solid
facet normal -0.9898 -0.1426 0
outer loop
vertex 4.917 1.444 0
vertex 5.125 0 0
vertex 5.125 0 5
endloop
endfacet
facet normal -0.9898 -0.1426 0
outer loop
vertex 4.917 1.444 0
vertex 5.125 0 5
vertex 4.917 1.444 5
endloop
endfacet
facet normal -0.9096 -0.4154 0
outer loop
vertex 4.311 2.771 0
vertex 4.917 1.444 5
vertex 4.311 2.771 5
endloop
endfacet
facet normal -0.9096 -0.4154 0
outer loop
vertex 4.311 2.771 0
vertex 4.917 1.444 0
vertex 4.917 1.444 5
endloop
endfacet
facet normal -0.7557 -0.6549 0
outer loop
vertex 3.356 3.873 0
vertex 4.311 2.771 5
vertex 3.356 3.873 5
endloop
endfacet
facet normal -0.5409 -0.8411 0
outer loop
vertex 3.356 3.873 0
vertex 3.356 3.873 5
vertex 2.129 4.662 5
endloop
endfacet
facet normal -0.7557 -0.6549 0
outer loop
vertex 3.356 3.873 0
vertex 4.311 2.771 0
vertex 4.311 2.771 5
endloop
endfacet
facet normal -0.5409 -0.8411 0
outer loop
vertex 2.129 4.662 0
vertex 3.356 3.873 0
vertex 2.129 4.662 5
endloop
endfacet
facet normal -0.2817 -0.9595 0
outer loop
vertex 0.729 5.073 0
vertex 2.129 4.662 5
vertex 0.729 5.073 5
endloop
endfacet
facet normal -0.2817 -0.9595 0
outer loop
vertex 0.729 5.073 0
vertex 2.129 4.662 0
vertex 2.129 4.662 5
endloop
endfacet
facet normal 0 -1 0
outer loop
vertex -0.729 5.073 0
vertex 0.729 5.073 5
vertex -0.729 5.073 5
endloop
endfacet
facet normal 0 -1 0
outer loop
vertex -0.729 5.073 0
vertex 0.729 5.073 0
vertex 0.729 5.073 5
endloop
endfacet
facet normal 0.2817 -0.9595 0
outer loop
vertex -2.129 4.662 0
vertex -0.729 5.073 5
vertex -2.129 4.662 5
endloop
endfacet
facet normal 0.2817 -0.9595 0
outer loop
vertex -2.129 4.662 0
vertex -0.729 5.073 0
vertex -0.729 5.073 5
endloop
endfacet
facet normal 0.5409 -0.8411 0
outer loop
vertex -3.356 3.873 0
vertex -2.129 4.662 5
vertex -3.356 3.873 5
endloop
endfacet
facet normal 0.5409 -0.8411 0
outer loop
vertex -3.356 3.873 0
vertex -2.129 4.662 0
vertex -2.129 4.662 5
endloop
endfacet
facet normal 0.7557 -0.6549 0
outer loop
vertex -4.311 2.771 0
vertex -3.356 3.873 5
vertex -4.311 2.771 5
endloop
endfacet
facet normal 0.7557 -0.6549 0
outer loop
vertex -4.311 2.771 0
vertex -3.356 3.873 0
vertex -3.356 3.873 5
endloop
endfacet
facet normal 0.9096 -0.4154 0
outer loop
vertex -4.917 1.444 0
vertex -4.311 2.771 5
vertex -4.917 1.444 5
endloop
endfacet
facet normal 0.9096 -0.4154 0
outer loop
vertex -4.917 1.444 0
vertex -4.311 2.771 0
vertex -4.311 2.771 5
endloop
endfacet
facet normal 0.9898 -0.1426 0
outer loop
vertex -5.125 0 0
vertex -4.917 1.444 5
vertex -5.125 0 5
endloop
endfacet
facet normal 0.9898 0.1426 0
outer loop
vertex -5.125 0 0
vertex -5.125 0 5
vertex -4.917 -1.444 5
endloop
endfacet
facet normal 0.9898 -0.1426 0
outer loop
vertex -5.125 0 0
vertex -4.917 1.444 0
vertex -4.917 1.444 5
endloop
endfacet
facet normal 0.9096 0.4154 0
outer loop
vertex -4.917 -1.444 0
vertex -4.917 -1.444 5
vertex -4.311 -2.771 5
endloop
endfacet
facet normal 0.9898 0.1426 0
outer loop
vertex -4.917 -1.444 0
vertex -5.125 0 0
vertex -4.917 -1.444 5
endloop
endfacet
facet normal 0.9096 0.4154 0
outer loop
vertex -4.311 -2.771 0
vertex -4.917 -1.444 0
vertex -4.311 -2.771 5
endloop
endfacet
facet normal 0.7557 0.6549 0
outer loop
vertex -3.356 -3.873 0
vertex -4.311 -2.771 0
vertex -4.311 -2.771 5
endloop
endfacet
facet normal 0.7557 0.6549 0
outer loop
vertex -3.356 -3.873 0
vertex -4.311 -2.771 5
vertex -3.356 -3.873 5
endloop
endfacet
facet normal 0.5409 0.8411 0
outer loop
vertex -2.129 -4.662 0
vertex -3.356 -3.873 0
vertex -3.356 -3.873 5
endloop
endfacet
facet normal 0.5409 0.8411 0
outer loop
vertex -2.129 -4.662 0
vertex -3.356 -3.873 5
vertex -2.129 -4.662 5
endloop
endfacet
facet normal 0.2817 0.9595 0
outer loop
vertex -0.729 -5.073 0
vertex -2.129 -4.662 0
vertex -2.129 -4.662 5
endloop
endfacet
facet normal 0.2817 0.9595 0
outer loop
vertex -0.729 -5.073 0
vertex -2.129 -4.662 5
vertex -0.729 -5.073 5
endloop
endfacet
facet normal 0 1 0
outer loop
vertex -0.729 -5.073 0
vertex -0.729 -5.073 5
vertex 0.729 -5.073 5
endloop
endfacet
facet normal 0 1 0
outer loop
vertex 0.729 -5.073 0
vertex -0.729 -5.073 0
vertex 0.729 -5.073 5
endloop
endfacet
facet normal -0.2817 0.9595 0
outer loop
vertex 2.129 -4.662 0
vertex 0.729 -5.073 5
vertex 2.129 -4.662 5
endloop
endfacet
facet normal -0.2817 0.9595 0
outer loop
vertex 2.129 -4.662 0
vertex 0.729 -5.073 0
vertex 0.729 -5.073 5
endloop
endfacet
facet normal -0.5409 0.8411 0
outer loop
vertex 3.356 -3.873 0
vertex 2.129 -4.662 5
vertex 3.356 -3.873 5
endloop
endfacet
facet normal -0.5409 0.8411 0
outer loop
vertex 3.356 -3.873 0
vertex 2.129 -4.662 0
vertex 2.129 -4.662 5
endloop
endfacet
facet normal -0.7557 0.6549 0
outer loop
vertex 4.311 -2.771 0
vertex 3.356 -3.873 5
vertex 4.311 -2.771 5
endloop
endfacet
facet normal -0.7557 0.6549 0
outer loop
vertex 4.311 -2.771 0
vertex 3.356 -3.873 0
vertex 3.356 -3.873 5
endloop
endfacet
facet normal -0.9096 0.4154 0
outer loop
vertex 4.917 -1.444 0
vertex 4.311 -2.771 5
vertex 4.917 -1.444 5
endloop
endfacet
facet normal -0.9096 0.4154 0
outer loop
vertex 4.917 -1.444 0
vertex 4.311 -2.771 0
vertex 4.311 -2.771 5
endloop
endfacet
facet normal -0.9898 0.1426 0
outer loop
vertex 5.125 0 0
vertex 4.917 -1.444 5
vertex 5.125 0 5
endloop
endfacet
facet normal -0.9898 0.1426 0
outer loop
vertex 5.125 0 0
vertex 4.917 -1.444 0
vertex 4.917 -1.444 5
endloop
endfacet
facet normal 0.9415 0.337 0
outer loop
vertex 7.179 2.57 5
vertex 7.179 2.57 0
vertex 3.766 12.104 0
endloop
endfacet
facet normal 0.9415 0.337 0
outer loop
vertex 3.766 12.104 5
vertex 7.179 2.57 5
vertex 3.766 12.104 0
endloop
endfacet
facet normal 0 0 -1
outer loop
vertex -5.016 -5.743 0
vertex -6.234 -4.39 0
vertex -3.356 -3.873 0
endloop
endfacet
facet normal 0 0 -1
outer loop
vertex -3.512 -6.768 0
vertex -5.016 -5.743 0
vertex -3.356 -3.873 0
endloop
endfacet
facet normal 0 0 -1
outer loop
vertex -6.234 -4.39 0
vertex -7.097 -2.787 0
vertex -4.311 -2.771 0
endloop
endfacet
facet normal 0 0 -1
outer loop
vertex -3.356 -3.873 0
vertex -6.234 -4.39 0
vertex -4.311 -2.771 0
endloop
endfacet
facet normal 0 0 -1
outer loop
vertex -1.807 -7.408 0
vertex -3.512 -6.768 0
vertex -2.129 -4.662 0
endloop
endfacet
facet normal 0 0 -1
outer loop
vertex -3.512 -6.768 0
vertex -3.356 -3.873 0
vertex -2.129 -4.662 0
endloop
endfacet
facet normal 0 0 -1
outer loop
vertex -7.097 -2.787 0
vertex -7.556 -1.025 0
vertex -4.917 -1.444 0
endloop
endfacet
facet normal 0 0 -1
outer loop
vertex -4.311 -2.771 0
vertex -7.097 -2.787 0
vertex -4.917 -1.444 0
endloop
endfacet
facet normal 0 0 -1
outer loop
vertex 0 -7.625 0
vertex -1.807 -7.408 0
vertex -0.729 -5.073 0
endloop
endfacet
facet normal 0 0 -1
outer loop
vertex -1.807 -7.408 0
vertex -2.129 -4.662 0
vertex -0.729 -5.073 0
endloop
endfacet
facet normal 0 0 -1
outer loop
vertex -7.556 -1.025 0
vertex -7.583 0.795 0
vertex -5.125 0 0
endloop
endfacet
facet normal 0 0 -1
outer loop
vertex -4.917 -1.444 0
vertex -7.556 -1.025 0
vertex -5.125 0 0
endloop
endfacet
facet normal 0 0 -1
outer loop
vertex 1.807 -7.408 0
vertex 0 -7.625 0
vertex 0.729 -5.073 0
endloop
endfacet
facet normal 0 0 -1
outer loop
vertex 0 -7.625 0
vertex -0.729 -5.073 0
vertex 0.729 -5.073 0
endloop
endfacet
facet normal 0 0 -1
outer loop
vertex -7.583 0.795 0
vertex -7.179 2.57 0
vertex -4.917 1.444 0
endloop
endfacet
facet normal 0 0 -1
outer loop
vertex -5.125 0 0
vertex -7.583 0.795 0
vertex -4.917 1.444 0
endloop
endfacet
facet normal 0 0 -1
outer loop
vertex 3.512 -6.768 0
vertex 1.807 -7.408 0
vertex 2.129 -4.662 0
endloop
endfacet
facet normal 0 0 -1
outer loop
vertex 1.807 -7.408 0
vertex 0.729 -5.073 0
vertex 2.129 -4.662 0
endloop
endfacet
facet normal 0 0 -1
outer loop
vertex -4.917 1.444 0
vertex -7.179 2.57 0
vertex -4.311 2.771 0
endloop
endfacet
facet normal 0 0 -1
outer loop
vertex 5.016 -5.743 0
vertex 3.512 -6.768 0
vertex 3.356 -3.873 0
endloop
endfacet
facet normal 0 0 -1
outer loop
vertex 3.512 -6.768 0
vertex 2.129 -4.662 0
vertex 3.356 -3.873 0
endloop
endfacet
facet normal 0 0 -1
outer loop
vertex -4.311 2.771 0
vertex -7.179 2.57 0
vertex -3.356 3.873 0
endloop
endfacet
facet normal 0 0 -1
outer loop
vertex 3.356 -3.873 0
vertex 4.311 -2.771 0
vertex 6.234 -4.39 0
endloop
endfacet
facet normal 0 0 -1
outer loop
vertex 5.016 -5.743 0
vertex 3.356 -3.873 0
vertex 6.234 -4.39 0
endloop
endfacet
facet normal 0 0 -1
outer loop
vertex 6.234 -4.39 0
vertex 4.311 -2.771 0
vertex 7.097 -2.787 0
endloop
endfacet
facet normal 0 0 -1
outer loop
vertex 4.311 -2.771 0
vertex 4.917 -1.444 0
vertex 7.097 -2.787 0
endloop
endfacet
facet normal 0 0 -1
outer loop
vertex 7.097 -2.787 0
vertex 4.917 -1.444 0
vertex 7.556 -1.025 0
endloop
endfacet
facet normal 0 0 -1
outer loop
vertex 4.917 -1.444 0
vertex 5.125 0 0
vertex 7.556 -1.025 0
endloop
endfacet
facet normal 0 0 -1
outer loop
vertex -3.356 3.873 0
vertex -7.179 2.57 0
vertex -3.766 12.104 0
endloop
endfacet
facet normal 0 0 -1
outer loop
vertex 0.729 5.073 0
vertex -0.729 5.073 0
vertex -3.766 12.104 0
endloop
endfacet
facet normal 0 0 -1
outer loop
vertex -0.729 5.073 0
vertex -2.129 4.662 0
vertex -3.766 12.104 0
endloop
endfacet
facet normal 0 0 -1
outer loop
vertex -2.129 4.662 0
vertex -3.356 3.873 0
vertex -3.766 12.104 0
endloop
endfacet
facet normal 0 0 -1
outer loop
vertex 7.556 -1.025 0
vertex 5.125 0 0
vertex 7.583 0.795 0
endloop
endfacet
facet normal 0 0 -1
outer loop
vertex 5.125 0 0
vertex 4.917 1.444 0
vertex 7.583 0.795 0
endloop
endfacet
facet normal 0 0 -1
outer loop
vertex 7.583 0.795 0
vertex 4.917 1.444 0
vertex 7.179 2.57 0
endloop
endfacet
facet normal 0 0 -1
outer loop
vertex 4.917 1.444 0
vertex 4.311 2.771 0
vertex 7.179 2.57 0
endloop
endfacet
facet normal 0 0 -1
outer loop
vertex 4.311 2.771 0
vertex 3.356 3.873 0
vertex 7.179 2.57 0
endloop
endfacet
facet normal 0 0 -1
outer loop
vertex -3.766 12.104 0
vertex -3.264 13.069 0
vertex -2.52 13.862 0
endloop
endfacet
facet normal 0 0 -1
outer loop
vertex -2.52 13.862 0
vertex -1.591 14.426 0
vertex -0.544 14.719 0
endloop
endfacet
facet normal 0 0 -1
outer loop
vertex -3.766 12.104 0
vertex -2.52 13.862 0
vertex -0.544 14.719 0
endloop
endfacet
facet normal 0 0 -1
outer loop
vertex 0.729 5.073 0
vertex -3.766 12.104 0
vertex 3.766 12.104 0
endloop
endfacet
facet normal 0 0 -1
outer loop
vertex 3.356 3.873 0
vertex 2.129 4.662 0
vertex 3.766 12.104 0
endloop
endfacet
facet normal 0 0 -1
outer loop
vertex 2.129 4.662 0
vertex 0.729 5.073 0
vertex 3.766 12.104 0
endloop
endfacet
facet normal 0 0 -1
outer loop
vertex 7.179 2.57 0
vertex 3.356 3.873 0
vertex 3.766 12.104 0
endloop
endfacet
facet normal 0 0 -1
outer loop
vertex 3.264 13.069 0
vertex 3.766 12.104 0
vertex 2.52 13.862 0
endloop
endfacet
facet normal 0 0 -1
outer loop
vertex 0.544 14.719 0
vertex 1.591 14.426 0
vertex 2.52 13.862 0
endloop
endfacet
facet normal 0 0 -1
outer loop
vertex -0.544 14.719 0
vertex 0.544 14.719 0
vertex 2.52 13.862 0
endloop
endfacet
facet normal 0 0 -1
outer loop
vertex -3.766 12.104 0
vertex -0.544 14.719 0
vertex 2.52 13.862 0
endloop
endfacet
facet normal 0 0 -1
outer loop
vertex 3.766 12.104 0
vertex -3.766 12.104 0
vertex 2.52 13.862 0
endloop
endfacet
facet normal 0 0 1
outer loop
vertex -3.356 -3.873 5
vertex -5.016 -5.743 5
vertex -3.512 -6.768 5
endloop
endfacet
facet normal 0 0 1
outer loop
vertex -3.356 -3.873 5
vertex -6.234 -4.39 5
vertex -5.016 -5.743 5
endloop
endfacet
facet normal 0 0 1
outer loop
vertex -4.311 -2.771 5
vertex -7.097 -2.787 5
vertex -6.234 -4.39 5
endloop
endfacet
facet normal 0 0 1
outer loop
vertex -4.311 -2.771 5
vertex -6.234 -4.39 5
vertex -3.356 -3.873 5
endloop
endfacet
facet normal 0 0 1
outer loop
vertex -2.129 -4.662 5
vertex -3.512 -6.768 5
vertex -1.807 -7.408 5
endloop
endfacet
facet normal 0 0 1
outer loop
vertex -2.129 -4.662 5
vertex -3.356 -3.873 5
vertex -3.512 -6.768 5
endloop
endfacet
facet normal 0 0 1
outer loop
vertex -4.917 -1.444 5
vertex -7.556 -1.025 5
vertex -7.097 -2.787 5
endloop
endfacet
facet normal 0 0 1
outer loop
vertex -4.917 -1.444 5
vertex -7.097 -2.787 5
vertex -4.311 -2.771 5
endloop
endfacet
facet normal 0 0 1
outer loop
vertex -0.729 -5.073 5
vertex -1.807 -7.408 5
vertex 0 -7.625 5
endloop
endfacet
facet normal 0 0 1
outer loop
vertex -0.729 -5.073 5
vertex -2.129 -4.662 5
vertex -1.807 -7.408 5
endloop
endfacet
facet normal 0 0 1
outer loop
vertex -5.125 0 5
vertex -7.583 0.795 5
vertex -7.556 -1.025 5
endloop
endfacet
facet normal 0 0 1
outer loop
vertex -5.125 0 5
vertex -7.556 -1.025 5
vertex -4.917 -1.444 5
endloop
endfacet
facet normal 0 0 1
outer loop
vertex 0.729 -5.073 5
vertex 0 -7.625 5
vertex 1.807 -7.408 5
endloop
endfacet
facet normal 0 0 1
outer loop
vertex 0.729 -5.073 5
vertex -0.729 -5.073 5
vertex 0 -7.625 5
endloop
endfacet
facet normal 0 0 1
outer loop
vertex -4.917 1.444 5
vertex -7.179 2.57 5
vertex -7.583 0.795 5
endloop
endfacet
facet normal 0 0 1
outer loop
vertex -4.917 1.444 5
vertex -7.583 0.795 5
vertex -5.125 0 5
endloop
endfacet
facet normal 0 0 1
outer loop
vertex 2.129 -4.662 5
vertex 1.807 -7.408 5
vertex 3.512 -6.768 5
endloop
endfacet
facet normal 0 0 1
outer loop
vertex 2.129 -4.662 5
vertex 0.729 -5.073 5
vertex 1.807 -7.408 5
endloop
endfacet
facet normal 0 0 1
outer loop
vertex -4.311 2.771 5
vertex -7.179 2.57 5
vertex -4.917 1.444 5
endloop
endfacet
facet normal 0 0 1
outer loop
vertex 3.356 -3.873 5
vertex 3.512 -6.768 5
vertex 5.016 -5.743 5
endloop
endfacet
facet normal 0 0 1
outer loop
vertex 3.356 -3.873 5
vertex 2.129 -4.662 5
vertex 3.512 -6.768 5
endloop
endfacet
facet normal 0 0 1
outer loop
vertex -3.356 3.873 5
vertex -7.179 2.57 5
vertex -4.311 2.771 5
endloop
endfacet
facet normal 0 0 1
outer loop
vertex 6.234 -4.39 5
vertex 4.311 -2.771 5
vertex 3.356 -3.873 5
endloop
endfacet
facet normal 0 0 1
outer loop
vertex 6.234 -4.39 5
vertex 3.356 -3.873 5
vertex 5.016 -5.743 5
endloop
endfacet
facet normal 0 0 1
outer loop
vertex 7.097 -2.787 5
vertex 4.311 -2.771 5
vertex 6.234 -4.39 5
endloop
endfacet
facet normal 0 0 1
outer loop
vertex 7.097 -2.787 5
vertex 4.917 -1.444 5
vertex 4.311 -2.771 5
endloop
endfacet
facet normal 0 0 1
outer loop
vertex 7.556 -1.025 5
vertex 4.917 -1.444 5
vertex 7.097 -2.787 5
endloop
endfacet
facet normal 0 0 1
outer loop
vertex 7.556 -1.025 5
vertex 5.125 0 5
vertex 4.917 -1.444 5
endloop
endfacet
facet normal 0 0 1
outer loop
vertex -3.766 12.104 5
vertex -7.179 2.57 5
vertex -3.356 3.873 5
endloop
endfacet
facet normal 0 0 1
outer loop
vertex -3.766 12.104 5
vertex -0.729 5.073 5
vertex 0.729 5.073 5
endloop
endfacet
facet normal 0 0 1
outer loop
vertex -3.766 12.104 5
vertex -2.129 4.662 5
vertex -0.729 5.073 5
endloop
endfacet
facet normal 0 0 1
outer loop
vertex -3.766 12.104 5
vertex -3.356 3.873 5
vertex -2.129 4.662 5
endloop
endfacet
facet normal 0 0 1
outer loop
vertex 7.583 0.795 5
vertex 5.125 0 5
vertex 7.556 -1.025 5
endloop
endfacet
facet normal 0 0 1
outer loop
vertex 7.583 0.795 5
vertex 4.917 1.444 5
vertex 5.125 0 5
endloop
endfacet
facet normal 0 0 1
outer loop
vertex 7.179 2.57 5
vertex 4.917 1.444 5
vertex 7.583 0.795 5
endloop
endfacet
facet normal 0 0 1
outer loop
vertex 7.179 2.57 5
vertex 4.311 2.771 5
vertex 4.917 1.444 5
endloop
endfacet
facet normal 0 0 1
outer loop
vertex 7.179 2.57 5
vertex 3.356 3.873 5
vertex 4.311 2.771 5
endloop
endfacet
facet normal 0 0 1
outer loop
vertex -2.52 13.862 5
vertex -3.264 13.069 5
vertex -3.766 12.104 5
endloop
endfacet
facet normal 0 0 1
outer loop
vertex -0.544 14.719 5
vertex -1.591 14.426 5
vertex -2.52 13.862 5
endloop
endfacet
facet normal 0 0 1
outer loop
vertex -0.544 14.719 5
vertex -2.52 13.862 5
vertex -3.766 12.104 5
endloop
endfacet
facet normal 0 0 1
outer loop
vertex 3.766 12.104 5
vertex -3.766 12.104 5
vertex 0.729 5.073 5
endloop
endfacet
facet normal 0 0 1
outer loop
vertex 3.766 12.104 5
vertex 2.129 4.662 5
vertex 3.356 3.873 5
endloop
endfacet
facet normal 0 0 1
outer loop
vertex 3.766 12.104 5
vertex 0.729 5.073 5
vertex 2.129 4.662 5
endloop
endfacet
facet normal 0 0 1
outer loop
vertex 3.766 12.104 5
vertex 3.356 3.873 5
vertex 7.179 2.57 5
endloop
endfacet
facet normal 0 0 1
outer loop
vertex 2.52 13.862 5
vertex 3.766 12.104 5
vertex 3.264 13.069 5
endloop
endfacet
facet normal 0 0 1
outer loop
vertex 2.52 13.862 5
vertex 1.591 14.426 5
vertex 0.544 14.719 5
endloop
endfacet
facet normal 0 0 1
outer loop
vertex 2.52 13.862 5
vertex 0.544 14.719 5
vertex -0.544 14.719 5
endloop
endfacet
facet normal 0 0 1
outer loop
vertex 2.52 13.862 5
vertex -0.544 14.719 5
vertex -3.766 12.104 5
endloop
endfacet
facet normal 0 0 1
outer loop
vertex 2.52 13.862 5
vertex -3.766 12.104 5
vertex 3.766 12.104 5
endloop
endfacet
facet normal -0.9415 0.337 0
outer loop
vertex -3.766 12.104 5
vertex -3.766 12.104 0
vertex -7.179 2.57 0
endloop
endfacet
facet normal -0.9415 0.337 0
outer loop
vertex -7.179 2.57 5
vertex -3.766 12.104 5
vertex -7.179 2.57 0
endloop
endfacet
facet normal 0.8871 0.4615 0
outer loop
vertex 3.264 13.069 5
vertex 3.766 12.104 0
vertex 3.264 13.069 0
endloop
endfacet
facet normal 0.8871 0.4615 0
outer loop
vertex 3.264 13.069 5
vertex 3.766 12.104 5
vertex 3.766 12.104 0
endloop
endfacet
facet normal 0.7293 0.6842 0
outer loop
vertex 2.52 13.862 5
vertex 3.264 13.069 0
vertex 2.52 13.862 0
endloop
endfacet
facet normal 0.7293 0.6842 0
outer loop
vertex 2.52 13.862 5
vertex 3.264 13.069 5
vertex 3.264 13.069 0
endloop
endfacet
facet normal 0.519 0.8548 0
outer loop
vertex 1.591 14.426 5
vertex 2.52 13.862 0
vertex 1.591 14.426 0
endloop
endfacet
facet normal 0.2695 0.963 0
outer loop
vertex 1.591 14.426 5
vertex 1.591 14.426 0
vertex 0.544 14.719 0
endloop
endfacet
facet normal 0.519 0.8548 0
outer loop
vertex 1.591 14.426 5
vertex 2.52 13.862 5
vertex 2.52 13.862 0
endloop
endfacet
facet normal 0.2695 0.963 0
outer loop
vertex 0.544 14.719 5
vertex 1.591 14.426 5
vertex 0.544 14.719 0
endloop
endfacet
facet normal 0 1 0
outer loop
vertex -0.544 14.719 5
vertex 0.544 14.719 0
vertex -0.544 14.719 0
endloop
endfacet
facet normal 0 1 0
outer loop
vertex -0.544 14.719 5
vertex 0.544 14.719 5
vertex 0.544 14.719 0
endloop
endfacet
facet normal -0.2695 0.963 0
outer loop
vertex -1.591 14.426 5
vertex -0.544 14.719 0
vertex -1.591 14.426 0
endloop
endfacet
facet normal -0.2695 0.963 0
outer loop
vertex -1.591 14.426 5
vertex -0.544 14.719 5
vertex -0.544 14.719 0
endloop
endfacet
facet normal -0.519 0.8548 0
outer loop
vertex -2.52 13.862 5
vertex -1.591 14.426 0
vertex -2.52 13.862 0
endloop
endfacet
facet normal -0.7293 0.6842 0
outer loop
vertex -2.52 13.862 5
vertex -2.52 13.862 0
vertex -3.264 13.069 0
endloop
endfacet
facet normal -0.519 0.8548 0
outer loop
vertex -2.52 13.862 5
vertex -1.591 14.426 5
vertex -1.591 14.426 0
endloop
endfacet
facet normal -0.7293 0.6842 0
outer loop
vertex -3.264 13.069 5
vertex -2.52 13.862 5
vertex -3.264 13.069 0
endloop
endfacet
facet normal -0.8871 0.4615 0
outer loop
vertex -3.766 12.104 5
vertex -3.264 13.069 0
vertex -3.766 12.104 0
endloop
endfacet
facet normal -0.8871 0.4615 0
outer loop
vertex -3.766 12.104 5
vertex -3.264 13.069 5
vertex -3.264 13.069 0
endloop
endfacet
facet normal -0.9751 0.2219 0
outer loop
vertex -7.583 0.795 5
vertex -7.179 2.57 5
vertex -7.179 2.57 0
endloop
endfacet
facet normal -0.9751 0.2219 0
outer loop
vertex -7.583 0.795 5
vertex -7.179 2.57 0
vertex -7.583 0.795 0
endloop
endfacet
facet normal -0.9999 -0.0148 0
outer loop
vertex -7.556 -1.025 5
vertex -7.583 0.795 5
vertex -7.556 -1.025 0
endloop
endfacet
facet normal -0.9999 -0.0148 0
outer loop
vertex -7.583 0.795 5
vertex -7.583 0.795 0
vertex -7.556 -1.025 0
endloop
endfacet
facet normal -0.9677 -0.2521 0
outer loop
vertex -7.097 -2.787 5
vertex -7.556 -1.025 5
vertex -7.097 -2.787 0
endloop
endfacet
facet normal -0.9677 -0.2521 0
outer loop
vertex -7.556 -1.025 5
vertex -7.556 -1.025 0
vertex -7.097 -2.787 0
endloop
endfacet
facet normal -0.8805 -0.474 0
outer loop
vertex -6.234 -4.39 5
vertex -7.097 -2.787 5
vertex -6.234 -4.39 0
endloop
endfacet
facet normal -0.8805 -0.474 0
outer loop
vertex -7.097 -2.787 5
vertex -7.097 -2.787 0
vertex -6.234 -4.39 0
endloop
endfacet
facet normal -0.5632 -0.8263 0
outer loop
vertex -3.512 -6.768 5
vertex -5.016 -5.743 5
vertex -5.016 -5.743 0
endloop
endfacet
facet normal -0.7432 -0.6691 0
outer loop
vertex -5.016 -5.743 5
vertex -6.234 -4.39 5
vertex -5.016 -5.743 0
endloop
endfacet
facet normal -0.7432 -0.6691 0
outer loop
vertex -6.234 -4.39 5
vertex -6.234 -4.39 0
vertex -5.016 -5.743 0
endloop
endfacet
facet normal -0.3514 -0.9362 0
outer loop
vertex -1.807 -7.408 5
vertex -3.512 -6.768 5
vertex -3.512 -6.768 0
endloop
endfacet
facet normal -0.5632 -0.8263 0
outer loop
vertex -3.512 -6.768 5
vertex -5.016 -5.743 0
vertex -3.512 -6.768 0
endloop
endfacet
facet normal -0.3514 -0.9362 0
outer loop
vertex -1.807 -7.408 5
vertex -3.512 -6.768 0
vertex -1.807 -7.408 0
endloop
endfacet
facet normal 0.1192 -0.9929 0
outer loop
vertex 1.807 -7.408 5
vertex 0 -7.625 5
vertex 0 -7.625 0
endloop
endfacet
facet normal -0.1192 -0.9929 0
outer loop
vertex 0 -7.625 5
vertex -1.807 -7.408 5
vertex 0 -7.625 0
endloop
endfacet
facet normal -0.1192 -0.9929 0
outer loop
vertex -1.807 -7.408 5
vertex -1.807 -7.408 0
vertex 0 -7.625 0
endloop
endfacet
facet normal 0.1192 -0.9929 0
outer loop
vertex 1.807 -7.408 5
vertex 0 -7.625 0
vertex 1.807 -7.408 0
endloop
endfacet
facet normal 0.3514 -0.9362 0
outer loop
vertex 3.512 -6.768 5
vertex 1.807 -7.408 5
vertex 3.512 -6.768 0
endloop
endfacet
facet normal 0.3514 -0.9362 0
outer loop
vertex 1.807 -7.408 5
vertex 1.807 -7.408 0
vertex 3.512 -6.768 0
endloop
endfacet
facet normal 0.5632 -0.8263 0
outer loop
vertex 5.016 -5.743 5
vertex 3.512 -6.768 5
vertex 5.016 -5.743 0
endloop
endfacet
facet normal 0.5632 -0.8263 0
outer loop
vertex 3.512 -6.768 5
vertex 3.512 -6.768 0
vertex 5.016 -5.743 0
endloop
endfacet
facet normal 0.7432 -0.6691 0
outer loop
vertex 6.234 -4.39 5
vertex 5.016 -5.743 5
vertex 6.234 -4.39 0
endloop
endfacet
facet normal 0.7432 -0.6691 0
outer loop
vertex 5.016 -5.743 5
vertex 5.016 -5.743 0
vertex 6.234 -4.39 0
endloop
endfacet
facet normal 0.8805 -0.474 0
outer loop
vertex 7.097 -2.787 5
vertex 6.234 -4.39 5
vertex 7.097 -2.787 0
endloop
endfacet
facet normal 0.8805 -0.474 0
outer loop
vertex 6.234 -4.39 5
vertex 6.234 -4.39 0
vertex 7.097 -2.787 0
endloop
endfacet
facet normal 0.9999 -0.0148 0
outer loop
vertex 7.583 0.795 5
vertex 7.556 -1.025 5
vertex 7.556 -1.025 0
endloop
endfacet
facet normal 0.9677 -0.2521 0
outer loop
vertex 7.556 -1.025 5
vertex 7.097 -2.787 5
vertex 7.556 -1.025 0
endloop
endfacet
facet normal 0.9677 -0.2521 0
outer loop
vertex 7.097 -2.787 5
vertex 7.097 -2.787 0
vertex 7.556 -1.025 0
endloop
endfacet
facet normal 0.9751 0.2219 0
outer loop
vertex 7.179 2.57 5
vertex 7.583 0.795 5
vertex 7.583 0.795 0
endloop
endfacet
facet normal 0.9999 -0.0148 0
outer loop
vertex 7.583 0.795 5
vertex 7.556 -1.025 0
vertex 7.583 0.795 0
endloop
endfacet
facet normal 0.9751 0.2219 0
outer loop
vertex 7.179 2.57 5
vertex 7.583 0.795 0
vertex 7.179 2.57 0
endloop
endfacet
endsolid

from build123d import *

# Parameters (mm, degrees)
SKETCH1_R           = 7.625014315
SKETCH1_R_2         = 5.125
BOSS_EXTRUDE1_DEPTH = 5
FILLET1_R           = 4


with BuildPart() as part:
    # Sketch1 → Boss-Extrude1 (new body)
    # profile 1 of 3: a face of its own
    with BuildSketch(Plane.XY):
        Circle(SKETCH1_R)
        Circle(SKETCH1_R_2, mode=Mode.SUBTRACT)
    # profile 2 of 3: a face of its own
    with BuildSketch(Plane.XY):
        with BuildLine():
            ThreePointArc((-7.178939445, 2.56976103), (-4.390124068, 6.234392831), (0, 7.625014315))
            Line((0, 7.625014315), (0, 22.625))
            Line((0, 22.625), (-7.178939445, 2.56976103))
        make_face()
    # profile 3 of 3: a face of its own
    with BuildSketch(Plane.XY):
        with BuildLine():
            Line((0, 22.625), (0, 7.625014315))
            ThreePointArc((0, 7.625014315), (4.390124068, 6.234392831), (7.178939445, 2.56976103))
            Line((7.178939445, 2.56976103), (0, 22.625))
        make_face()
    extrude(amount=BOSS_EXTRUDE1_DEPTH)

    # Fillet1
    fillet1_edges = [part.edges().sort_by_distance(p)[0] for p in [
        (0, 22.625, 2.5),
    ]]
    fillet(fillet1_edges, radius=FILLET1_R)


solid = part.part
